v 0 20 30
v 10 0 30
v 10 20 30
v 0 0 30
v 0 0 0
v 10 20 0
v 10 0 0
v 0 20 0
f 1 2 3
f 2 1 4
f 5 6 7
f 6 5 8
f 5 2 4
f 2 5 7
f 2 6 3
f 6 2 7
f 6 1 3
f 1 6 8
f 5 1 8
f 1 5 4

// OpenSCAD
// Generated by scadwright. Do not hand-edit —
// edit the Python source and regenerate.

resize(newsize=[10, 20, 30]) {
    cube([1, 2, 3], center=false);
}
